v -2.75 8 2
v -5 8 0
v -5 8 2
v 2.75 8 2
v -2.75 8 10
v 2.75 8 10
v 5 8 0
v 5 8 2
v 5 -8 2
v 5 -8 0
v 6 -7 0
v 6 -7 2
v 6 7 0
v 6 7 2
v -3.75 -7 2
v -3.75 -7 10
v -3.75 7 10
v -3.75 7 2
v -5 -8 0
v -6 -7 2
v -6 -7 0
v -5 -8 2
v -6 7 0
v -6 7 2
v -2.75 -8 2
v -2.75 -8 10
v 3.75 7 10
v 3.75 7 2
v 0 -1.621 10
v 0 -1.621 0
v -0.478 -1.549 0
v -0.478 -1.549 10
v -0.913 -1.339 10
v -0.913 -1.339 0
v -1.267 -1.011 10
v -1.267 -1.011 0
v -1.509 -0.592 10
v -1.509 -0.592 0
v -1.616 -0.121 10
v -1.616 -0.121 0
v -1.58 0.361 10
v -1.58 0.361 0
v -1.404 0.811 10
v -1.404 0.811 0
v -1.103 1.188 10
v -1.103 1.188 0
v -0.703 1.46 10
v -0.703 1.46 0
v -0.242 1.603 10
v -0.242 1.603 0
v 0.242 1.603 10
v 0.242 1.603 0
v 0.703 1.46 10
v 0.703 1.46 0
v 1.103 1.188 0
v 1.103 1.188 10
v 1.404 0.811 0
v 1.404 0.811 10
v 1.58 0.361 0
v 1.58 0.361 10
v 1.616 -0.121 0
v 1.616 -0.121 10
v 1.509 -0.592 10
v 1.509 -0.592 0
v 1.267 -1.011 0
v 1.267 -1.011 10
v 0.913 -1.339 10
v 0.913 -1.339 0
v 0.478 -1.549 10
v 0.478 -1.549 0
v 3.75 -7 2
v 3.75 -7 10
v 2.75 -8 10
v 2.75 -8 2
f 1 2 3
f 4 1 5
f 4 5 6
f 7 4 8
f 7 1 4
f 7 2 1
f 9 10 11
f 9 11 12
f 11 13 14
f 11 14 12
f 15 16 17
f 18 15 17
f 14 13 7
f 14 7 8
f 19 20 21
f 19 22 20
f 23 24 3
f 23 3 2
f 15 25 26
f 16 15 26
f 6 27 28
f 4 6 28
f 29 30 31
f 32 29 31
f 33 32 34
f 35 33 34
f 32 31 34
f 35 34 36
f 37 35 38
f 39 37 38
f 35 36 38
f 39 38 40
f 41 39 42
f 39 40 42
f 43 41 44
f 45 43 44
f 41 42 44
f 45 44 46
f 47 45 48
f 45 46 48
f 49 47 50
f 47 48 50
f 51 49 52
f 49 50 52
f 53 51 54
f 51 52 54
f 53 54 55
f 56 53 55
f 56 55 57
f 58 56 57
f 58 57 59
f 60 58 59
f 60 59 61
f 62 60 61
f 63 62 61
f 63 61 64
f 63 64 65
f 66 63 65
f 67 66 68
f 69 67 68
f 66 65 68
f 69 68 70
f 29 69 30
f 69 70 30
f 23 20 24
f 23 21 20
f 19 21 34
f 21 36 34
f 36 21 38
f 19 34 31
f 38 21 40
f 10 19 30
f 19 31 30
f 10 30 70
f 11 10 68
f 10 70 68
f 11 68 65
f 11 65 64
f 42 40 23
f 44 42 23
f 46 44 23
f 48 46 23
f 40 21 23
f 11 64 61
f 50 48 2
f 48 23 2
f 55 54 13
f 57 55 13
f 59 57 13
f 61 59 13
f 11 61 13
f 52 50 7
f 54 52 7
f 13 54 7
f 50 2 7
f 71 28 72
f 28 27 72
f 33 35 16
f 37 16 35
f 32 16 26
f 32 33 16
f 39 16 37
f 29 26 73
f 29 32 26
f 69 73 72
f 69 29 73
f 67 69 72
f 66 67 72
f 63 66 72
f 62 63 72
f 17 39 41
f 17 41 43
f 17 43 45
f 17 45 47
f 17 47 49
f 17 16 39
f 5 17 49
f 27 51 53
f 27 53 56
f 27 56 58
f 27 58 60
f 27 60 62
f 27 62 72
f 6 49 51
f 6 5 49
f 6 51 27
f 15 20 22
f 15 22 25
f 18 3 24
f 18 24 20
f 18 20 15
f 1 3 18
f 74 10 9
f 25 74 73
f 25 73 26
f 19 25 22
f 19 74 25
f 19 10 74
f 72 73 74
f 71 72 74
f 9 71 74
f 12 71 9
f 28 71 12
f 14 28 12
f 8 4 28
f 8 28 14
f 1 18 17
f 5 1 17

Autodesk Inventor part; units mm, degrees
ref_plane "YZ Plane" through (0, 0, 0) normal (1, 0, 0) x (0, 1, 0)
ref_plane "XZ Plane" through (0, 0, 0) normal (0, 1, 0) x (-1, 0, 0)
ref_plane "XY Plane" through (0, 0, 0) normal (0, 0, 1) x (1, 0, 0)
sketch "Esboço1" plane through (0, 0, 0) normal (0, 0, 1) x (1, 0, 0)
  line L0 (-6, 8) -> (6, 8)
  line L1 (6, 8) -> (6, -8)
  line L2 (6, -8) -> (-6, -8)
  line L3 (-6, -8) -> (-6, 8)
  line L4 (-6, 8) -> (6, -8) construction
  line L5 (6, 8) -> (-6, -8) construction
  point P0 (0, 0)
  dimension "d0" = 12
  dimension "d1" = 16
extrude "Extrusão1" add sketch "Esboço1" along normal blind 10
sketch "Esboço3" plane through (0, 0, 10) normal (0, 0, 1) x (1, 0, 0)
  line L0 (6, -8) -> (-6, -8)
  line L1 (-6, -8) -> (-6, 8)
  line L2 (-6, 8) -> (6, 8)
  line L3 (6, 8) -> (6, -8)
  line L4 (6, -8) -> (-6, 8) construction
  line L5 (-6, -8) -> (6, 8) construction
  line L6 (3.75, -8) -> (-3.75, -8)
  line L7 (-3.75, -8) -> (-3.75, 8)
  line L8 (-3.75, 8) -> (3.75, 8)
  line L9 (3.75, 8) -> (3.75, -8)
  line L10 (3.75, -8) -> (-3.75, 8) construction
  line L11 (-3.75, -8) -> (3.75, 8) construction
  point P0 (0, 0)
  dimension "d4" = 12
  dimension "d5" = 16
  dimension "d6" = 7.5
extrude "Extrusão2" cut sketch "Esboço3" against normal blind 8 contours L0 L9 L2 L3 | L0 L1 L2 L7
chamfer "Chanfro1" distance 1 angle 45 8 edges at (6, -8, 1) (-6, -8, 1) (6, 8, 1) (-6, 8, 1) (-3.75, -8, 6) (-3.75, 8, 6) (3.75, 8, 6) (3.75, -8, 6)
sketch "Esboço4" plane through (0, 0, 10) normal (0, 0, 1) x (1, 0, 0)
  circle A0 centre (0, 0) radius 1.5 construction
  dimension "d12" = 3
hole "Furo1" at (0, 0, 10) direction (0, 0, -1) diameter 3.242 end through all thread size "M4x0.7" class "6H" standard "ANSI Metric M Profile"
properties part number "porcaDeslizante"
